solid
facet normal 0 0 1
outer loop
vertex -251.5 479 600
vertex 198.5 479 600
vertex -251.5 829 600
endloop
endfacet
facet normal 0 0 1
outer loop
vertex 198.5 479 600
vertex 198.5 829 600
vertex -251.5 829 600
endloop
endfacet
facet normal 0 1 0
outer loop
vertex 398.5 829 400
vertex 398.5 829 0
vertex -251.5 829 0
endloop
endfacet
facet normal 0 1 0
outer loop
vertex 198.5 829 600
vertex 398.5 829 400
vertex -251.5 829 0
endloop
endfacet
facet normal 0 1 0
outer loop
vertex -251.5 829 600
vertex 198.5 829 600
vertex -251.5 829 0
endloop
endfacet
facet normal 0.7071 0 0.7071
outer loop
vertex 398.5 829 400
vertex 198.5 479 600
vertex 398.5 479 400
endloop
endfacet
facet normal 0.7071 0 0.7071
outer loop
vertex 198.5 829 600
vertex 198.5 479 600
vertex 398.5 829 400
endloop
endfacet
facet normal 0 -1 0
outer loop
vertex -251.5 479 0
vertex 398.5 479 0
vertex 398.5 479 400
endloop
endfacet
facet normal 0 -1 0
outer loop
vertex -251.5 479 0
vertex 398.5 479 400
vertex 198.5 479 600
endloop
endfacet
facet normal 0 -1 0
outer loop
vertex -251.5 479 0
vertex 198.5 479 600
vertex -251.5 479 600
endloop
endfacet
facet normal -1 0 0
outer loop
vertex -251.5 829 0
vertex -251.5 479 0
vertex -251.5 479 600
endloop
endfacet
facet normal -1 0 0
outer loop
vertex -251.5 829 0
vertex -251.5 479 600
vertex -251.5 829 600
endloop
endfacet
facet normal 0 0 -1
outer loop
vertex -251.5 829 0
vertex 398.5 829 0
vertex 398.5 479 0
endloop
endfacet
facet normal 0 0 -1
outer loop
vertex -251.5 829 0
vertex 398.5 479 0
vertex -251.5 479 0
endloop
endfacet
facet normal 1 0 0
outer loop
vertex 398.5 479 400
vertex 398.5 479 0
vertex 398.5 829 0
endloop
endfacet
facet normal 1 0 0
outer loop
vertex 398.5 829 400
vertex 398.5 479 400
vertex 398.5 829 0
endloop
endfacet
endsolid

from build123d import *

# Parameters (mm, degrees)
SKETCH_1_W          = 503
SKETCH_1_H          = 558
EXTRUDE_1_DEPTH     = 865
SKETCH_2_W          = 200
SKETCH_2_H          = 398
CUT_EXTRUDE_1_DEPTH = 1039.785348376
SKETCH_3_W          = 94
SKETCH_3_H          = 148
CUT_EXTRUDE_2_DEPTH = 1039.785348376
SKETCH_5_W          = 650
SKETCH_5_H          = 350
EXTRUDE_3_DEPTH     = 600
CHAMFER_1_SIZE      = 200
SKETCH_6_W          = 1000
SKETCH_6_H          = 4830
EXTRUDE_4_DEPTH     = 30
SKETCH_7_W          = 625.774769939
SKETCH_7_H          = 5017.85714808
CUT_EXTRUDE_3_DEPTH = 3931.092365327
SKETCH_8_W          = 1324.574856274
SKETCH_8_H          = 1226.736940753
CUT_EXTRUDE_4_DEPTH = 1300.413329161


with BuildPart() as part:
    # 草图1 → 凸台-拉伸1 (new body)
    with BuildSketch(Plane.XY):
        Rectangle(SKETCH_1_W, SKETCH_1_H)
    extrude(amount=EXTRUDE_1_DEPTH)

    # 草图2 → 切除-拉伸1 (cut, through all)
    with BuildSketch(Plane(origin=(251.5, 0, 0), x_dir=(0, 0, -1), z_dir=(1, 0, 0))):
        Rectangle(SKETCH_2_W, SKETCH_2_H)
    extrude(amount=-CUT_EXTRUDE_1_DEPTH, mode=Mode.SUBTRACT)

    # 草图3 → 切除-拉伸2 (cut, through all)
    with BuildSketch(Plane(origin=(251.5, 0, 0), x_dir=(0, 0, -1), z_dir=(1, 0, 0))):
        with Locations((-53, -279)):
            Rectangle(SKETCH_3_W, SKETCH_3_H)
    cut_extrude_2 = extrude(amount=-CUT_EXTRUDE_2_DEPTH, mode=Mode.SUBTRACT)

    # 镜向1: 切除-拉伸2 across plane
    add(cut_extrude_2.mirror(Plane.ZX), mode=Mode.SUBTRACT)

    # 草图8 → 切除-拉伸4 (cut, through all)
    with BuildSketch(Plane(origin=(251.5, 0, 0), x_dir=(0, 0, -1), z_dir=(1, 0, 0))):
        with Locations((-463.569646277, -264.855691223)):
            Rectangle(SKETCH_8_W, SKETCH_8_H)
    extrude(amount=-CUT_EXTRUDE_4_DEPTH, mode=Mode.SUBTRACT)


with BuildPart() as body_2:
    # 草图5 → 凸台-拉伸3 (new body)
    with BuildSketch(Plane(origin=(0, 0, 0), x_dir=(-1, 0, 0), z_dir=(0, 0, -1))):
        with Locations((-73.5, 654)):
            Rectangle(SKETCH_5_W, SKETCH_5_H)
    extrude(amount=-EXTRUDE_3_DEPTH)

    # 倒角1
    chamfer_1_edges = [body_2.edges().sort_by_distance(p)[0] for p in [
        (398.5, 654, 600),
    ]]
    chamfer(chamfer_1_edges, length=CHAMFER_1_SIZE)


with BuildPart() as body_3:
    # 草图6 → 凸台-拉伸4 (new body)
    with BuildSketch(Plane(origin=(0, 0, 0), x_dir=(-1, 0, 0), z_dir=(0, 0, -1))):
        with Locations((-248.5, -1286)):
            Rectangle(SKETCH_6_W, SKETCH_6_H)
    extrude(amount=EXTRUDE_4_DEPTH)

    # 草图7 → 切除-拉伸3 (cut, through all)
    with BuildSketch(Plane(origin=(748.5, 0, 0), x_dir=(0, 0, -1), z_dir=(1, 0, 0))):
        with Locations((312.88738497, -1379.92857404)):
            Rectangle(SKETCH_7_W, SKETCH_7_H)
    extrude(amount=-CUT_EXTRUDE_3_DEPTH, mode=Mode.SUBTRACT)


solid = body_2.part
